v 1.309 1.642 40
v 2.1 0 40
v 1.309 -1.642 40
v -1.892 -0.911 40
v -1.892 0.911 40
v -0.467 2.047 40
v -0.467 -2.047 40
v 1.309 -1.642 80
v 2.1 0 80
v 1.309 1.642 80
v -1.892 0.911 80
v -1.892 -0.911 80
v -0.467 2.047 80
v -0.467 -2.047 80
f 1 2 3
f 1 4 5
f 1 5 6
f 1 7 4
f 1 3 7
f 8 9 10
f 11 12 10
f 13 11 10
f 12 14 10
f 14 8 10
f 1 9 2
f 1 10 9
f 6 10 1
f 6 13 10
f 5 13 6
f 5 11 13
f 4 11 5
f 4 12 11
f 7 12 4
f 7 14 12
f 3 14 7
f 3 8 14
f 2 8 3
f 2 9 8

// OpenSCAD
module extrude_polyline(vertices, height) {
    linear_extrude(height = height) {
        polygon(points = vertices);
    }
}

vertices = [
    [-10, -10, 0], [-3.1, -10, 0], [-3.1, -8.2, 0], [-4.5, -8.2, 0], [-4.5, -5, 0], [4.5, -5, 0], [4.5, -8.2, 0], [3.1, -8.2, 0], [3.1, -10, 0], [10, -10, 0], [10, -3.1, 0], [8.2, -3.1, 0], [8.2, -4.5, 0], [5, -4.5, 0], [5, 4.5, 0], [8.2, 4.5, 0], [8.2, 3.1, 0], [10, 3.1, 0], [10, 10, 0], [3.1, 10, 0], [3.1, 8.2, 0], [4.5, 8.2, 0], [4.5, 5, 0], [-4.5, 5, 0], [-4.5, 8.2, 0], [-3.1, 8.2, 0], [-3.1, 10, 0], [-10, 10, 0], [-10, 3.1, 0], [-8.2, 3.1, 0], [-8.2, 4.5, 0], [-5, 4.5, 0], [-5, -4.5, 0], [-8.2, -4.5, 0], [-8.2, -3.1, 0], [-10, -3.1, 0]
];

radius = 2.1;
circle_points = [for (i = [0:360]) [radius * cos(i), radius * sin(i)]];

extrude_polyline(vertices, 40);

translate([0, 0, 40]) {
    linear_extrude(height = 40) {
        circle(r = 2.1);
    }
}
